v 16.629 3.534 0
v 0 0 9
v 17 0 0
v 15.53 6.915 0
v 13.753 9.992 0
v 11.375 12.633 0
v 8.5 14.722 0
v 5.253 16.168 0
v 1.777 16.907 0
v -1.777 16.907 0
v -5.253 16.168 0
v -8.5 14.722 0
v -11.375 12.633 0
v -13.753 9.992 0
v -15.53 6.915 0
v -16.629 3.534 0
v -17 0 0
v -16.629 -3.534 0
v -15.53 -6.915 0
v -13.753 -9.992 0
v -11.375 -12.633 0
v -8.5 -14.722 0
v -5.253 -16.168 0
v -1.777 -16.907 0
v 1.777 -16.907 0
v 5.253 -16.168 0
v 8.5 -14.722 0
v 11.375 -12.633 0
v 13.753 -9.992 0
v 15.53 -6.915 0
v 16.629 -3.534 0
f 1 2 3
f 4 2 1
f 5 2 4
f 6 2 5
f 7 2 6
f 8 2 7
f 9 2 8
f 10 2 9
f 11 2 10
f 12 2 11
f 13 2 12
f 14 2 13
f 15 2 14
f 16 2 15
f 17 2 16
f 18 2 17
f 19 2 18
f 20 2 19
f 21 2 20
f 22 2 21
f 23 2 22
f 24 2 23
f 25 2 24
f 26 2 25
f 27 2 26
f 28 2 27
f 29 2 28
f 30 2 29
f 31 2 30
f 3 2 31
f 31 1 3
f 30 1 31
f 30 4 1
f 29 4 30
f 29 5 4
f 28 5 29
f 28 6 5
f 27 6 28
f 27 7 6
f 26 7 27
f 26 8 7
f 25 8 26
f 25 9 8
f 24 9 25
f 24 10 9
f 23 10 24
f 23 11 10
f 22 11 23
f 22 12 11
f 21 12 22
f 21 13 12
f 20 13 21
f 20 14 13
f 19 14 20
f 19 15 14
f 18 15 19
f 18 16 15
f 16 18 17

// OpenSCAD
// Generated by SolidPython 1.0.1 on 2020-07-29 00:39:25


cylinder(h = 9, r1 = 17, r2 = 0);
/***********************************************
*********      SolidPython code:      **********
************************************************
 
# import packages: SolidPython
from solid import *
from solid.utils import *
from itertools import chain, combinations


class Resize:

    def __init__(self, scad_file):
        self.scad_file = scad_file
        #self.scad_file = import_scad(scad_file)
        # cone/cylinder param:
        self.r1 = 0
        self.r2 = 0
        self.h = 0
        # rectangular prism param:
        self.w = 0
        self.l = 0
        # ellipse param:
        self.r = 0

    # import OpenScad code (file name corresponds to shape)


    # classify shape + parameters
    def assign(self, param1, param2, param3):
        if self.scad_file == 'cone.scad':
            self.r1 = param1
            self.r2 = param2
            self.h = param3
        elif self.scad_file == 'cylinder.scad':
            self.r1 = param1
            self.r2 = param2
            self.h = param3
        elif self.scad_file == 'rectangularPrism.scad':
            self.h = param1
            self.l = param2
            self.w = param3
        else:
            self.r = param1
            self.h = param2

    # resize parameters
    def iterate(self):
        x = range(3, 20, 2)
        i = 1
        if self.scad_file == 'cone.scad':
            tempList = list(combinations(x, 2))
            for temp in tempList:
                param1 = temp[0]
                param2 = temp[1]
                filepath = 'produced_scad_files/' + 'cone' + str(param1) + '_' + str(param2) + '_' + '.scad'
                scad_render_to_file(cylinder(h=param1, r1=param2, r2=0), filepath)

        elif self.scad_file == 'cylinder.scad':
            tempList = list(combinations(x, 3))
            for temp in tempList:
                param1 = temp[0]
                param2 = temp[1]
                filepath = 'produced_scad_files/' + 'cylinder' + str(param1) + '_' + str(param2) + '_' + '.scad'
                scad_render_to_file(cylinder(h=param1, r1=param2, r2=param2), filepath)

        elif self.scad_file == 'rectangularPrism.scad':
            tempList = list(combinations(x, 3))
            for temp in tempList:
                param1 = temp[0]
                param2 = temp[1]
                param3 = temp[2]
                filepath = 'produced_scad_files/' + 'rectangularPrism' + str(param1) + '_' + str(param2) + '_' + str(
                    param3) + '.scad'
                scad_render_to_file(cube(size=(param1, param2, param3)), filepath)

        elif self.scad_file == 'ellipse.scad':
            tempList = list(combinations(x, 4))
            for temp in tempList:
                param1 = temp[0]
                param2 = temp[1]
                param3 = temp[2]
                param4 = temp[3]
                filepath = 'produced_scad_files/' + 'ellipse' + str(param1) + '_' + str(param2) + '_' + str(param3) + '_' + str(param4) + '.scad'
                scad_render_to_file(scale([param1, param2, param3])(sphere(r=param4)), filepath)

    def render_to_scadfile(self):
        scad_render_to_file(scad, 'example.scad') 
 
************************************************/
